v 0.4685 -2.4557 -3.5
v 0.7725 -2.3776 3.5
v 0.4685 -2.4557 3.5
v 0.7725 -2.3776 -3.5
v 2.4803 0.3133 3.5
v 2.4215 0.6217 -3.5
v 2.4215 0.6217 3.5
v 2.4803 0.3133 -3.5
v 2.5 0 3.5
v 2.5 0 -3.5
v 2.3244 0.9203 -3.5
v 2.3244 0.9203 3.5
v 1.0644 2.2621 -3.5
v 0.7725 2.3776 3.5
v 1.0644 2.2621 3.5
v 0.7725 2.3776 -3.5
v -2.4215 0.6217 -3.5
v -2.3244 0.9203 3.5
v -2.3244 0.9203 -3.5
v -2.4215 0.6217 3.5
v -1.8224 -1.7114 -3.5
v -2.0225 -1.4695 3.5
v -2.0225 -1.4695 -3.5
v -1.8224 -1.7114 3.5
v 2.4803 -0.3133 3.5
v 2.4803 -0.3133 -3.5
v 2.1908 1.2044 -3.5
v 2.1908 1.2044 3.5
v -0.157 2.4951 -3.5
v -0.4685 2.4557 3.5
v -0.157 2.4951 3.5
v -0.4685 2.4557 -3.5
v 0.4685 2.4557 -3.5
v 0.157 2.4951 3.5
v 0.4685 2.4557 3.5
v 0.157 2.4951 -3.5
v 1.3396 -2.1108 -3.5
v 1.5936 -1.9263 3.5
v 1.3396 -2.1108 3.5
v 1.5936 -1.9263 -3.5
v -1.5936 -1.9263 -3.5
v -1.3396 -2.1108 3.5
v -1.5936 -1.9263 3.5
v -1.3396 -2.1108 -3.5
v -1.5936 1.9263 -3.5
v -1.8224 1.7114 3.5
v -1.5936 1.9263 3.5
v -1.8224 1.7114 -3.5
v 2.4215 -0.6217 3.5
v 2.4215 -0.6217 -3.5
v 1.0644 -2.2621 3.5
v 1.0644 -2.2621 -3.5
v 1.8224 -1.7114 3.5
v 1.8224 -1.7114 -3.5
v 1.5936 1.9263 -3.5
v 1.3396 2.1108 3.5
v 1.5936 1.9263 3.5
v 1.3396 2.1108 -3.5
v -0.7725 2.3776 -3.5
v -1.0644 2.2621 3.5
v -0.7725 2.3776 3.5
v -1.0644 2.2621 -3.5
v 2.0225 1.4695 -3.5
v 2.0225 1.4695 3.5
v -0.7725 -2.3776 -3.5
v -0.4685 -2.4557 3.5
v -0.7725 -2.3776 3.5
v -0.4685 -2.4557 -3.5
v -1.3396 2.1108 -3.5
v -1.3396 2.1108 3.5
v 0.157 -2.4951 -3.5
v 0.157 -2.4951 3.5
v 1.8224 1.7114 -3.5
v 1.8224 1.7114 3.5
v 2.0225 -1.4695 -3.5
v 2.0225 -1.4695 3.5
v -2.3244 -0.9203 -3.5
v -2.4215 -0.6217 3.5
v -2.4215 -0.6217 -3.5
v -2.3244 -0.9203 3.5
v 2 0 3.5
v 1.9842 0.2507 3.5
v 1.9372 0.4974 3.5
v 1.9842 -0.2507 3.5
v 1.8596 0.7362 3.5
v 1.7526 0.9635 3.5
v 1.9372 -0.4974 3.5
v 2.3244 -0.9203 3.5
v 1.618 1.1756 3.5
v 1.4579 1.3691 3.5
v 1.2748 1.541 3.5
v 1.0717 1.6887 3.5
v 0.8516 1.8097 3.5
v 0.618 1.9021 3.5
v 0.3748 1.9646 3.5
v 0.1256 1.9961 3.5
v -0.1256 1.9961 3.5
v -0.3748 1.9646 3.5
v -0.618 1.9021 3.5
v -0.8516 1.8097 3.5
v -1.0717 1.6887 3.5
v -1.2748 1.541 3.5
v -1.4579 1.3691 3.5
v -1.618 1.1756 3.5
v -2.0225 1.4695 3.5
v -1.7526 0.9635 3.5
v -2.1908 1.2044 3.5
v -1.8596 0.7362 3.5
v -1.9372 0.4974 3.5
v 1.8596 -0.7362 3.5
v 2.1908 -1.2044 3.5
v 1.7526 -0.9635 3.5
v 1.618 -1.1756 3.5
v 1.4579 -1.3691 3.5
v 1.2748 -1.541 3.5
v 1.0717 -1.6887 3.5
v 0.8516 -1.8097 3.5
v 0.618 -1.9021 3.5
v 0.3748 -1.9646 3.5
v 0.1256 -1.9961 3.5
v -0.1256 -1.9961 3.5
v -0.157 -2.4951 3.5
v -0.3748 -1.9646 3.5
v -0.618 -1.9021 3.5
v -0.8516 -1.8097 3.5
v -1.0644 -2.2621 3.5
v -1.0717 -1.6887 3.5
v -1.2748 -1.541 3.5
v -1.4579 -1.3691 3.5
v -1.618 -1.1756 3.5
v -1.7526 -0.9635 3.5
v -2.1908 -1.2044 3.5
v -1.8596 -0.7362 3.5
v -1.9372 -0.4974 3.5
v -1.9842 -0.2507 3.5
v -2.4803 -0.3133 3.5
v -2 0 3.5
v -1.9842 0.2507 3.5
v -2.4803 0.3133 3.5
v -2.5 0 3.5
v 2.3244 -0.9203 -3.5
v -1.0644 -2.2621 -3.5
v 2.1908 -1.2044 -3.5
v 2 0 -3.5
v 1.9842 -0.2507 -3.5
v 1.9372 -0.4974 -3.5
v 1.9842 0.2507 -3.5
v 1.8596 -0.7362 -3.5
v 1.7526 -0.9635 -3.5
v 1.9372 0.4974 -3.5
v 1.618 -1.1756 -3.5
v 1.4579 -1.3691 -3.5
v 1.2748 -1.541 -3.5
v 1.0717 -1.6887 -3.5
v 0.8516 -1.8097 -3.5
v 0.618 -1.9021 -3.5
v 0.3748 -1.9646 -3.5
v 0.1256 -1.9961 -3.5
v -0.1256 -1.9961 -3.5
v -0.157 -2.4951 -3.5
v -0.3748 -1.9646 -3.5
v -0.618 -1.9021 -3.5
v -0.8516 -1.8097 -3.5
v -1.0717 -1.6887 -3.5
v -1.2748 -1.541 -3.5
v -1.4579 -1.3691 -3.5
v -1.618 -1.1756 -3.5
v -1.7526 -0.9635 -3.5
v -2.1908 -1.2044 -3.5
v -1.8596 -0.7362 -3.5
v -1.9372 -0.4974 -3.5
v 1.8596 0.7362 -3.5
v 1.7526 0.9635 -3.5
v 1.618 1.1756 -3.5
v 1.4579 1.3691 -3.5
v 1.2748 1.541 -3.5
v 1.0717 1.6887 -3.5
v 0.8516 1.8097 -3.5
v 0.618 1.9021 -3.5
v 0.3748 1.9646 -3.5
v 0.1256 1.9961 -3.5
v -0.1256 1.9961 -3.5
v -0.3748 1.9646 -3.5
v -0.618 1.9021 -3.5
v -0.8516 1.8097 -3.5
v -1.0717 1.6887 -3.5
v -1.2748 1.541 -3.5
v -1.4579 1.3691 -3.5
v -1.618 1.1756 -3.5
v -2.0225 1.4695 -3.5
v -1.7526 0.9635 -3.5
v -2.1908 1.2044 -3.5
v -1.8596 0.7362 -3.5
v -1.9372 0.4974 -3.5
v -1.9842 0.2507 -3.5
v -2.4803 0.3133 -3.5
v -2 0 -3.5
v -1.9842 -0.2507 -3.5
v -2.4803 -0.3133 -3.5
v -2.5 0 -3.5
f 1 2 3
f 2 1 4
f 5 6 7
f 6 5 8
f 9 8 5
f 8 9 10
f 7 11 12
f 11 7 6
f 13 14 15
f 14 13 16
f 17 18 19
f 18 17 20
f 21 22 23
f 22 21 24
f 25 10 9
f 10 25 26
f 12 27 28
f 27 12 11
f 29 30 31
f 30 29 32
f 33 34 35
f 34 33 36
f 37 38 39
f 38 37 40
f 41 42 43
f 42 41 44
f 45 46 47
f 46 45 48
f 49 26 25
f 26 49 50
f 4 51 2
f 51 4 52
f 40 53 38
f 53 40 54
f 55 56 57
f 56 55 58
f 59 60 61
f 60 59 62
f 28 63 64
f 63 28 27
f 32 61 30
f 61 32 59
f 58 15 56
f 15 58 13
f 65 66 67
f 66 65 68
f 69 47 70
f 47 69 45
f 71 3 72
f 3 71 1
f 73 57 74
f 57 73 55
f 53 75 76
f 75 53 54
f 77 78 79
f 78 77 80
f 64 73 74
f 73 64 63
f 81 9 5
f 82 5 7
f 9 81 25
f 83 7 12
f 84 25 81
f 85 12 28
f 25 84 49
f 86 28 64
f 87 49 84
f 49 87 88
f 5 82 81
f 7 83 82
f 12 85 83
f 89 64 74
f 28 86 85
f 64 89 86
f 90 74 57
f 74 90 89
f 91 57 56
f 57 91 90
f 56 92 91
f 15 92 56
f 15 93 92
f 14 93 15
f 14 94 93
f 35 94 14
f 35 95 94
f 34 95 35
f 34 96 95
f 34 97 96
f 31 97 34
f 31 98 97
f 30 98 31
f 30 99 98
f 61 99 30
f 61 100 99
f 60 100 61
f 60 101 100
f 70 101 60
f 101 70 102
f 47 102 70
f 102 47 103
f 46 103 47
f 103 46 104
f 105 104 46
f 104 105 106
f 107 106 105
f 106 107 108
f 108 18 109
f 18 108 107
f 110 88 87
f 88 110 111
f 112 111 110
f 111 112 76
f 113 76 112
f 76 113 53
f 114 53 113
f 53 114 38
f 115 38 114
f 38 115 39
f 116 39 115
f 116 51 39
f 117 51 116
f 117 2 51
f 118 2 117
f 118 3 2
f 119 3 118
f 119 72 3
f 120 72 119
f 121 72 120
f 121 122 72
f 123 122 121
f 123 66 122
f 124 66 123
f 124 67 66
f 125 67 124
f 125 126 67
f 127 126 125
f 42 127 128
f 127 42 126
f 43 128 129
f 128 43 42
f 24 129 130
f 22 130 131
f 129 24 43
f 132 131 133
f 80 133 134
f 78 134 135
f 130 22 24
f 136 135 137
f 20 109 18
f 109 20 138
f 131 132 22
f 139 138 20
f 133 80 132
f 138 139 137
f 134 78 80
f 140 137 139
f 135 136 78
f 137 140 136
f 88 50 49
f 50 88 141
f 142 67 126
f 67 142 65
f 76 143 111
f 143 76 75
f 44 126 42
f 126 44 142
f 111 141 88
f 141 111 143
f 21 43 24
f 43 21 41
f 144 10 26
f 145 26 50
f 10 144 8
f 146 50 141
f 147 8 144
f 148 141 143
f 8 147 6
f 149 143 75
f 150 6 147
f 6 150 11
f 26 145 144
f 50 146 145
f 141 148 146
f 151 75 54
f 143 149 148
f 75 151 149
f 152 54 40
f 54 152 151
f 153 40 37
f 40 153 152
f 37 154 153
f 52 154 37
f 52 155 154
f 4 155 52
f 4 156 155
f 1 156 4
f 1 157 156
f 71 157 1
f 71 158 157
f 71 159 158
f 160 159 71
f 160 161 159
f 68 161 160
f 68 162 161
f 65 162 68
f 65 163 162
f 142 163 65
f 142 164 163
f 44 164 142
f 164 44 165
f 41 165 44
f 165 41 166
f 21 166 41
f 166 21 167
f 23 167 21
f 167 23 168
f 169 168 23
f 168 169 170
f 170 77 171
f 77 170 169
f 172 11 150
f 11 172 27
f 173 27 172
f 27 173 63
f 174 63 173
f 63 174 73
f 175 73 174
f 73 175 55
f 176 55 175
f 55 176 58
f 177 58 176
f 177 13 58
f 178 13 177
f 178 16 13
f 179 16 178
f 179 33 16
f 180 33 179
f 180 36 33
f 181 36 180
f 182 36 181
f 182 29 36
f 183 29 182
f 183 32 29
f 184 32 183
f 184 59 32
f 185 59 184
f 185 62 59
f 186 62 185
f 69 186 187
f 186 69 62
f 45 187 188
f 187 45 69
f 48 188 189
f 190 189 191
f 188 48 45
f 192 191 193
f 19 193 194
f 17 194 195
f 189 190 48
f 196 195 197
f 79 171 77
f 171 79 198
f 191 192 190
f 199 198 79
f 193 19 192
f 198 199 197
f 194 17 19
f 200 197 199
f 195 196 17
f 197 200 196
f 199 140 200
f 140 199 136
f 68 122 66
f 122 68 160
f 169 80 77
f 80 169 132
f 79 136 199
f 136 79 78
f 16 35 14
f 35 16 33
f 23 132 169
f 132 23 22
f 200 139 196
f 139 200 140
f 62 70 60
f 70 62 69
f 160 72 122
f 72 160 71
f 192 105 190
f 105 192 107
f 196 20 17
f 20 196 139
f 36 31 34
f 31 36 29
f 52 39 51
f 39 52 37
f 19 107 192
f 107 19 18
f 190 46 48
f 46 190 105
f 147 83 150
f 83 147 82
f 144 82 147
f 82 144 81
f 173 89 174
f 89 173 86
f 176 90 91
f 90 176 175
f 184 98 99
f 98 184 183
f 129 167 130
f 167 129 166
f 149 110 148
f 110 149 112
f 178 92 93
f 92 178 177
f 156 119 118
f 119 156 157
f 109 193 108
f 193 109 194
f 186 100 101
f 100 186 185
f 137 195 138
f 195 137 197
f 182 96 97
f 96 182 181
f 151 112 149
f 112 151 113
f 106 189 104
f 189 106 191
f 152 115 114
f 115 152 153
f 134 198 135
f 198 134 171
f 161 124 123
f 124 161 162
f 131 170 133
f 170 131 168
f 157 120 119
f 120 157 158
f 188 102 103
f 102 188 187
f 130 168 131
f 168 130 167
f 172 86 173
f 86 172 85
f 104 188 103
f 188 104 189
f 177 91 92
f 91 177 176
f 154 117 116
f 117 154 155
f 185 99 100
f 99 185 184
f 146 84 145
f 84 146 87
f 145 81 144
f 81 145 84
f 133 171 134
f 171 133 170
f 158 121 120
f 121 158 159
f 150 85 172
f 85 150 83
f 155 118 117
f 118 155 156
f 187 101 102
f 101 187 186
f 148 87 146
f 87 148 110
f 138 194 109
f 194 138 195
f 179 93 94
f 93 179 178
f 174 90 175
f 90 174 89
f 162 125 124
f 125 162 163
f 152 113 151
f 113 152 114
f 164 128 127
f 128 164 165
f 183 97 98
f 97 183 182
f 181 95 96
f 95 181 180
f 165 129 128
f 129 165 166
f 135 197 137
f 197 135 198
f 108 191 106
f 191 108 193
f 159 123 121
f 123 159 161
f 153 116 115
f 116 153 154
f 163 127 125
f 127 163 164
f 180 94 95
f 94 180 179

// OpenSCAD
$fn = 50;


difference() {
	union() {
		translate(v = [0, 0, -3.5000000000]) {
			cylinder(h = 7, r = 2.5000000000);
		}
	}
	union() {
		translate(v = [0, 0, -100.0000000000]) {
			cylinder(h = 200, r = 2.0000000000);
		}
	}
}
